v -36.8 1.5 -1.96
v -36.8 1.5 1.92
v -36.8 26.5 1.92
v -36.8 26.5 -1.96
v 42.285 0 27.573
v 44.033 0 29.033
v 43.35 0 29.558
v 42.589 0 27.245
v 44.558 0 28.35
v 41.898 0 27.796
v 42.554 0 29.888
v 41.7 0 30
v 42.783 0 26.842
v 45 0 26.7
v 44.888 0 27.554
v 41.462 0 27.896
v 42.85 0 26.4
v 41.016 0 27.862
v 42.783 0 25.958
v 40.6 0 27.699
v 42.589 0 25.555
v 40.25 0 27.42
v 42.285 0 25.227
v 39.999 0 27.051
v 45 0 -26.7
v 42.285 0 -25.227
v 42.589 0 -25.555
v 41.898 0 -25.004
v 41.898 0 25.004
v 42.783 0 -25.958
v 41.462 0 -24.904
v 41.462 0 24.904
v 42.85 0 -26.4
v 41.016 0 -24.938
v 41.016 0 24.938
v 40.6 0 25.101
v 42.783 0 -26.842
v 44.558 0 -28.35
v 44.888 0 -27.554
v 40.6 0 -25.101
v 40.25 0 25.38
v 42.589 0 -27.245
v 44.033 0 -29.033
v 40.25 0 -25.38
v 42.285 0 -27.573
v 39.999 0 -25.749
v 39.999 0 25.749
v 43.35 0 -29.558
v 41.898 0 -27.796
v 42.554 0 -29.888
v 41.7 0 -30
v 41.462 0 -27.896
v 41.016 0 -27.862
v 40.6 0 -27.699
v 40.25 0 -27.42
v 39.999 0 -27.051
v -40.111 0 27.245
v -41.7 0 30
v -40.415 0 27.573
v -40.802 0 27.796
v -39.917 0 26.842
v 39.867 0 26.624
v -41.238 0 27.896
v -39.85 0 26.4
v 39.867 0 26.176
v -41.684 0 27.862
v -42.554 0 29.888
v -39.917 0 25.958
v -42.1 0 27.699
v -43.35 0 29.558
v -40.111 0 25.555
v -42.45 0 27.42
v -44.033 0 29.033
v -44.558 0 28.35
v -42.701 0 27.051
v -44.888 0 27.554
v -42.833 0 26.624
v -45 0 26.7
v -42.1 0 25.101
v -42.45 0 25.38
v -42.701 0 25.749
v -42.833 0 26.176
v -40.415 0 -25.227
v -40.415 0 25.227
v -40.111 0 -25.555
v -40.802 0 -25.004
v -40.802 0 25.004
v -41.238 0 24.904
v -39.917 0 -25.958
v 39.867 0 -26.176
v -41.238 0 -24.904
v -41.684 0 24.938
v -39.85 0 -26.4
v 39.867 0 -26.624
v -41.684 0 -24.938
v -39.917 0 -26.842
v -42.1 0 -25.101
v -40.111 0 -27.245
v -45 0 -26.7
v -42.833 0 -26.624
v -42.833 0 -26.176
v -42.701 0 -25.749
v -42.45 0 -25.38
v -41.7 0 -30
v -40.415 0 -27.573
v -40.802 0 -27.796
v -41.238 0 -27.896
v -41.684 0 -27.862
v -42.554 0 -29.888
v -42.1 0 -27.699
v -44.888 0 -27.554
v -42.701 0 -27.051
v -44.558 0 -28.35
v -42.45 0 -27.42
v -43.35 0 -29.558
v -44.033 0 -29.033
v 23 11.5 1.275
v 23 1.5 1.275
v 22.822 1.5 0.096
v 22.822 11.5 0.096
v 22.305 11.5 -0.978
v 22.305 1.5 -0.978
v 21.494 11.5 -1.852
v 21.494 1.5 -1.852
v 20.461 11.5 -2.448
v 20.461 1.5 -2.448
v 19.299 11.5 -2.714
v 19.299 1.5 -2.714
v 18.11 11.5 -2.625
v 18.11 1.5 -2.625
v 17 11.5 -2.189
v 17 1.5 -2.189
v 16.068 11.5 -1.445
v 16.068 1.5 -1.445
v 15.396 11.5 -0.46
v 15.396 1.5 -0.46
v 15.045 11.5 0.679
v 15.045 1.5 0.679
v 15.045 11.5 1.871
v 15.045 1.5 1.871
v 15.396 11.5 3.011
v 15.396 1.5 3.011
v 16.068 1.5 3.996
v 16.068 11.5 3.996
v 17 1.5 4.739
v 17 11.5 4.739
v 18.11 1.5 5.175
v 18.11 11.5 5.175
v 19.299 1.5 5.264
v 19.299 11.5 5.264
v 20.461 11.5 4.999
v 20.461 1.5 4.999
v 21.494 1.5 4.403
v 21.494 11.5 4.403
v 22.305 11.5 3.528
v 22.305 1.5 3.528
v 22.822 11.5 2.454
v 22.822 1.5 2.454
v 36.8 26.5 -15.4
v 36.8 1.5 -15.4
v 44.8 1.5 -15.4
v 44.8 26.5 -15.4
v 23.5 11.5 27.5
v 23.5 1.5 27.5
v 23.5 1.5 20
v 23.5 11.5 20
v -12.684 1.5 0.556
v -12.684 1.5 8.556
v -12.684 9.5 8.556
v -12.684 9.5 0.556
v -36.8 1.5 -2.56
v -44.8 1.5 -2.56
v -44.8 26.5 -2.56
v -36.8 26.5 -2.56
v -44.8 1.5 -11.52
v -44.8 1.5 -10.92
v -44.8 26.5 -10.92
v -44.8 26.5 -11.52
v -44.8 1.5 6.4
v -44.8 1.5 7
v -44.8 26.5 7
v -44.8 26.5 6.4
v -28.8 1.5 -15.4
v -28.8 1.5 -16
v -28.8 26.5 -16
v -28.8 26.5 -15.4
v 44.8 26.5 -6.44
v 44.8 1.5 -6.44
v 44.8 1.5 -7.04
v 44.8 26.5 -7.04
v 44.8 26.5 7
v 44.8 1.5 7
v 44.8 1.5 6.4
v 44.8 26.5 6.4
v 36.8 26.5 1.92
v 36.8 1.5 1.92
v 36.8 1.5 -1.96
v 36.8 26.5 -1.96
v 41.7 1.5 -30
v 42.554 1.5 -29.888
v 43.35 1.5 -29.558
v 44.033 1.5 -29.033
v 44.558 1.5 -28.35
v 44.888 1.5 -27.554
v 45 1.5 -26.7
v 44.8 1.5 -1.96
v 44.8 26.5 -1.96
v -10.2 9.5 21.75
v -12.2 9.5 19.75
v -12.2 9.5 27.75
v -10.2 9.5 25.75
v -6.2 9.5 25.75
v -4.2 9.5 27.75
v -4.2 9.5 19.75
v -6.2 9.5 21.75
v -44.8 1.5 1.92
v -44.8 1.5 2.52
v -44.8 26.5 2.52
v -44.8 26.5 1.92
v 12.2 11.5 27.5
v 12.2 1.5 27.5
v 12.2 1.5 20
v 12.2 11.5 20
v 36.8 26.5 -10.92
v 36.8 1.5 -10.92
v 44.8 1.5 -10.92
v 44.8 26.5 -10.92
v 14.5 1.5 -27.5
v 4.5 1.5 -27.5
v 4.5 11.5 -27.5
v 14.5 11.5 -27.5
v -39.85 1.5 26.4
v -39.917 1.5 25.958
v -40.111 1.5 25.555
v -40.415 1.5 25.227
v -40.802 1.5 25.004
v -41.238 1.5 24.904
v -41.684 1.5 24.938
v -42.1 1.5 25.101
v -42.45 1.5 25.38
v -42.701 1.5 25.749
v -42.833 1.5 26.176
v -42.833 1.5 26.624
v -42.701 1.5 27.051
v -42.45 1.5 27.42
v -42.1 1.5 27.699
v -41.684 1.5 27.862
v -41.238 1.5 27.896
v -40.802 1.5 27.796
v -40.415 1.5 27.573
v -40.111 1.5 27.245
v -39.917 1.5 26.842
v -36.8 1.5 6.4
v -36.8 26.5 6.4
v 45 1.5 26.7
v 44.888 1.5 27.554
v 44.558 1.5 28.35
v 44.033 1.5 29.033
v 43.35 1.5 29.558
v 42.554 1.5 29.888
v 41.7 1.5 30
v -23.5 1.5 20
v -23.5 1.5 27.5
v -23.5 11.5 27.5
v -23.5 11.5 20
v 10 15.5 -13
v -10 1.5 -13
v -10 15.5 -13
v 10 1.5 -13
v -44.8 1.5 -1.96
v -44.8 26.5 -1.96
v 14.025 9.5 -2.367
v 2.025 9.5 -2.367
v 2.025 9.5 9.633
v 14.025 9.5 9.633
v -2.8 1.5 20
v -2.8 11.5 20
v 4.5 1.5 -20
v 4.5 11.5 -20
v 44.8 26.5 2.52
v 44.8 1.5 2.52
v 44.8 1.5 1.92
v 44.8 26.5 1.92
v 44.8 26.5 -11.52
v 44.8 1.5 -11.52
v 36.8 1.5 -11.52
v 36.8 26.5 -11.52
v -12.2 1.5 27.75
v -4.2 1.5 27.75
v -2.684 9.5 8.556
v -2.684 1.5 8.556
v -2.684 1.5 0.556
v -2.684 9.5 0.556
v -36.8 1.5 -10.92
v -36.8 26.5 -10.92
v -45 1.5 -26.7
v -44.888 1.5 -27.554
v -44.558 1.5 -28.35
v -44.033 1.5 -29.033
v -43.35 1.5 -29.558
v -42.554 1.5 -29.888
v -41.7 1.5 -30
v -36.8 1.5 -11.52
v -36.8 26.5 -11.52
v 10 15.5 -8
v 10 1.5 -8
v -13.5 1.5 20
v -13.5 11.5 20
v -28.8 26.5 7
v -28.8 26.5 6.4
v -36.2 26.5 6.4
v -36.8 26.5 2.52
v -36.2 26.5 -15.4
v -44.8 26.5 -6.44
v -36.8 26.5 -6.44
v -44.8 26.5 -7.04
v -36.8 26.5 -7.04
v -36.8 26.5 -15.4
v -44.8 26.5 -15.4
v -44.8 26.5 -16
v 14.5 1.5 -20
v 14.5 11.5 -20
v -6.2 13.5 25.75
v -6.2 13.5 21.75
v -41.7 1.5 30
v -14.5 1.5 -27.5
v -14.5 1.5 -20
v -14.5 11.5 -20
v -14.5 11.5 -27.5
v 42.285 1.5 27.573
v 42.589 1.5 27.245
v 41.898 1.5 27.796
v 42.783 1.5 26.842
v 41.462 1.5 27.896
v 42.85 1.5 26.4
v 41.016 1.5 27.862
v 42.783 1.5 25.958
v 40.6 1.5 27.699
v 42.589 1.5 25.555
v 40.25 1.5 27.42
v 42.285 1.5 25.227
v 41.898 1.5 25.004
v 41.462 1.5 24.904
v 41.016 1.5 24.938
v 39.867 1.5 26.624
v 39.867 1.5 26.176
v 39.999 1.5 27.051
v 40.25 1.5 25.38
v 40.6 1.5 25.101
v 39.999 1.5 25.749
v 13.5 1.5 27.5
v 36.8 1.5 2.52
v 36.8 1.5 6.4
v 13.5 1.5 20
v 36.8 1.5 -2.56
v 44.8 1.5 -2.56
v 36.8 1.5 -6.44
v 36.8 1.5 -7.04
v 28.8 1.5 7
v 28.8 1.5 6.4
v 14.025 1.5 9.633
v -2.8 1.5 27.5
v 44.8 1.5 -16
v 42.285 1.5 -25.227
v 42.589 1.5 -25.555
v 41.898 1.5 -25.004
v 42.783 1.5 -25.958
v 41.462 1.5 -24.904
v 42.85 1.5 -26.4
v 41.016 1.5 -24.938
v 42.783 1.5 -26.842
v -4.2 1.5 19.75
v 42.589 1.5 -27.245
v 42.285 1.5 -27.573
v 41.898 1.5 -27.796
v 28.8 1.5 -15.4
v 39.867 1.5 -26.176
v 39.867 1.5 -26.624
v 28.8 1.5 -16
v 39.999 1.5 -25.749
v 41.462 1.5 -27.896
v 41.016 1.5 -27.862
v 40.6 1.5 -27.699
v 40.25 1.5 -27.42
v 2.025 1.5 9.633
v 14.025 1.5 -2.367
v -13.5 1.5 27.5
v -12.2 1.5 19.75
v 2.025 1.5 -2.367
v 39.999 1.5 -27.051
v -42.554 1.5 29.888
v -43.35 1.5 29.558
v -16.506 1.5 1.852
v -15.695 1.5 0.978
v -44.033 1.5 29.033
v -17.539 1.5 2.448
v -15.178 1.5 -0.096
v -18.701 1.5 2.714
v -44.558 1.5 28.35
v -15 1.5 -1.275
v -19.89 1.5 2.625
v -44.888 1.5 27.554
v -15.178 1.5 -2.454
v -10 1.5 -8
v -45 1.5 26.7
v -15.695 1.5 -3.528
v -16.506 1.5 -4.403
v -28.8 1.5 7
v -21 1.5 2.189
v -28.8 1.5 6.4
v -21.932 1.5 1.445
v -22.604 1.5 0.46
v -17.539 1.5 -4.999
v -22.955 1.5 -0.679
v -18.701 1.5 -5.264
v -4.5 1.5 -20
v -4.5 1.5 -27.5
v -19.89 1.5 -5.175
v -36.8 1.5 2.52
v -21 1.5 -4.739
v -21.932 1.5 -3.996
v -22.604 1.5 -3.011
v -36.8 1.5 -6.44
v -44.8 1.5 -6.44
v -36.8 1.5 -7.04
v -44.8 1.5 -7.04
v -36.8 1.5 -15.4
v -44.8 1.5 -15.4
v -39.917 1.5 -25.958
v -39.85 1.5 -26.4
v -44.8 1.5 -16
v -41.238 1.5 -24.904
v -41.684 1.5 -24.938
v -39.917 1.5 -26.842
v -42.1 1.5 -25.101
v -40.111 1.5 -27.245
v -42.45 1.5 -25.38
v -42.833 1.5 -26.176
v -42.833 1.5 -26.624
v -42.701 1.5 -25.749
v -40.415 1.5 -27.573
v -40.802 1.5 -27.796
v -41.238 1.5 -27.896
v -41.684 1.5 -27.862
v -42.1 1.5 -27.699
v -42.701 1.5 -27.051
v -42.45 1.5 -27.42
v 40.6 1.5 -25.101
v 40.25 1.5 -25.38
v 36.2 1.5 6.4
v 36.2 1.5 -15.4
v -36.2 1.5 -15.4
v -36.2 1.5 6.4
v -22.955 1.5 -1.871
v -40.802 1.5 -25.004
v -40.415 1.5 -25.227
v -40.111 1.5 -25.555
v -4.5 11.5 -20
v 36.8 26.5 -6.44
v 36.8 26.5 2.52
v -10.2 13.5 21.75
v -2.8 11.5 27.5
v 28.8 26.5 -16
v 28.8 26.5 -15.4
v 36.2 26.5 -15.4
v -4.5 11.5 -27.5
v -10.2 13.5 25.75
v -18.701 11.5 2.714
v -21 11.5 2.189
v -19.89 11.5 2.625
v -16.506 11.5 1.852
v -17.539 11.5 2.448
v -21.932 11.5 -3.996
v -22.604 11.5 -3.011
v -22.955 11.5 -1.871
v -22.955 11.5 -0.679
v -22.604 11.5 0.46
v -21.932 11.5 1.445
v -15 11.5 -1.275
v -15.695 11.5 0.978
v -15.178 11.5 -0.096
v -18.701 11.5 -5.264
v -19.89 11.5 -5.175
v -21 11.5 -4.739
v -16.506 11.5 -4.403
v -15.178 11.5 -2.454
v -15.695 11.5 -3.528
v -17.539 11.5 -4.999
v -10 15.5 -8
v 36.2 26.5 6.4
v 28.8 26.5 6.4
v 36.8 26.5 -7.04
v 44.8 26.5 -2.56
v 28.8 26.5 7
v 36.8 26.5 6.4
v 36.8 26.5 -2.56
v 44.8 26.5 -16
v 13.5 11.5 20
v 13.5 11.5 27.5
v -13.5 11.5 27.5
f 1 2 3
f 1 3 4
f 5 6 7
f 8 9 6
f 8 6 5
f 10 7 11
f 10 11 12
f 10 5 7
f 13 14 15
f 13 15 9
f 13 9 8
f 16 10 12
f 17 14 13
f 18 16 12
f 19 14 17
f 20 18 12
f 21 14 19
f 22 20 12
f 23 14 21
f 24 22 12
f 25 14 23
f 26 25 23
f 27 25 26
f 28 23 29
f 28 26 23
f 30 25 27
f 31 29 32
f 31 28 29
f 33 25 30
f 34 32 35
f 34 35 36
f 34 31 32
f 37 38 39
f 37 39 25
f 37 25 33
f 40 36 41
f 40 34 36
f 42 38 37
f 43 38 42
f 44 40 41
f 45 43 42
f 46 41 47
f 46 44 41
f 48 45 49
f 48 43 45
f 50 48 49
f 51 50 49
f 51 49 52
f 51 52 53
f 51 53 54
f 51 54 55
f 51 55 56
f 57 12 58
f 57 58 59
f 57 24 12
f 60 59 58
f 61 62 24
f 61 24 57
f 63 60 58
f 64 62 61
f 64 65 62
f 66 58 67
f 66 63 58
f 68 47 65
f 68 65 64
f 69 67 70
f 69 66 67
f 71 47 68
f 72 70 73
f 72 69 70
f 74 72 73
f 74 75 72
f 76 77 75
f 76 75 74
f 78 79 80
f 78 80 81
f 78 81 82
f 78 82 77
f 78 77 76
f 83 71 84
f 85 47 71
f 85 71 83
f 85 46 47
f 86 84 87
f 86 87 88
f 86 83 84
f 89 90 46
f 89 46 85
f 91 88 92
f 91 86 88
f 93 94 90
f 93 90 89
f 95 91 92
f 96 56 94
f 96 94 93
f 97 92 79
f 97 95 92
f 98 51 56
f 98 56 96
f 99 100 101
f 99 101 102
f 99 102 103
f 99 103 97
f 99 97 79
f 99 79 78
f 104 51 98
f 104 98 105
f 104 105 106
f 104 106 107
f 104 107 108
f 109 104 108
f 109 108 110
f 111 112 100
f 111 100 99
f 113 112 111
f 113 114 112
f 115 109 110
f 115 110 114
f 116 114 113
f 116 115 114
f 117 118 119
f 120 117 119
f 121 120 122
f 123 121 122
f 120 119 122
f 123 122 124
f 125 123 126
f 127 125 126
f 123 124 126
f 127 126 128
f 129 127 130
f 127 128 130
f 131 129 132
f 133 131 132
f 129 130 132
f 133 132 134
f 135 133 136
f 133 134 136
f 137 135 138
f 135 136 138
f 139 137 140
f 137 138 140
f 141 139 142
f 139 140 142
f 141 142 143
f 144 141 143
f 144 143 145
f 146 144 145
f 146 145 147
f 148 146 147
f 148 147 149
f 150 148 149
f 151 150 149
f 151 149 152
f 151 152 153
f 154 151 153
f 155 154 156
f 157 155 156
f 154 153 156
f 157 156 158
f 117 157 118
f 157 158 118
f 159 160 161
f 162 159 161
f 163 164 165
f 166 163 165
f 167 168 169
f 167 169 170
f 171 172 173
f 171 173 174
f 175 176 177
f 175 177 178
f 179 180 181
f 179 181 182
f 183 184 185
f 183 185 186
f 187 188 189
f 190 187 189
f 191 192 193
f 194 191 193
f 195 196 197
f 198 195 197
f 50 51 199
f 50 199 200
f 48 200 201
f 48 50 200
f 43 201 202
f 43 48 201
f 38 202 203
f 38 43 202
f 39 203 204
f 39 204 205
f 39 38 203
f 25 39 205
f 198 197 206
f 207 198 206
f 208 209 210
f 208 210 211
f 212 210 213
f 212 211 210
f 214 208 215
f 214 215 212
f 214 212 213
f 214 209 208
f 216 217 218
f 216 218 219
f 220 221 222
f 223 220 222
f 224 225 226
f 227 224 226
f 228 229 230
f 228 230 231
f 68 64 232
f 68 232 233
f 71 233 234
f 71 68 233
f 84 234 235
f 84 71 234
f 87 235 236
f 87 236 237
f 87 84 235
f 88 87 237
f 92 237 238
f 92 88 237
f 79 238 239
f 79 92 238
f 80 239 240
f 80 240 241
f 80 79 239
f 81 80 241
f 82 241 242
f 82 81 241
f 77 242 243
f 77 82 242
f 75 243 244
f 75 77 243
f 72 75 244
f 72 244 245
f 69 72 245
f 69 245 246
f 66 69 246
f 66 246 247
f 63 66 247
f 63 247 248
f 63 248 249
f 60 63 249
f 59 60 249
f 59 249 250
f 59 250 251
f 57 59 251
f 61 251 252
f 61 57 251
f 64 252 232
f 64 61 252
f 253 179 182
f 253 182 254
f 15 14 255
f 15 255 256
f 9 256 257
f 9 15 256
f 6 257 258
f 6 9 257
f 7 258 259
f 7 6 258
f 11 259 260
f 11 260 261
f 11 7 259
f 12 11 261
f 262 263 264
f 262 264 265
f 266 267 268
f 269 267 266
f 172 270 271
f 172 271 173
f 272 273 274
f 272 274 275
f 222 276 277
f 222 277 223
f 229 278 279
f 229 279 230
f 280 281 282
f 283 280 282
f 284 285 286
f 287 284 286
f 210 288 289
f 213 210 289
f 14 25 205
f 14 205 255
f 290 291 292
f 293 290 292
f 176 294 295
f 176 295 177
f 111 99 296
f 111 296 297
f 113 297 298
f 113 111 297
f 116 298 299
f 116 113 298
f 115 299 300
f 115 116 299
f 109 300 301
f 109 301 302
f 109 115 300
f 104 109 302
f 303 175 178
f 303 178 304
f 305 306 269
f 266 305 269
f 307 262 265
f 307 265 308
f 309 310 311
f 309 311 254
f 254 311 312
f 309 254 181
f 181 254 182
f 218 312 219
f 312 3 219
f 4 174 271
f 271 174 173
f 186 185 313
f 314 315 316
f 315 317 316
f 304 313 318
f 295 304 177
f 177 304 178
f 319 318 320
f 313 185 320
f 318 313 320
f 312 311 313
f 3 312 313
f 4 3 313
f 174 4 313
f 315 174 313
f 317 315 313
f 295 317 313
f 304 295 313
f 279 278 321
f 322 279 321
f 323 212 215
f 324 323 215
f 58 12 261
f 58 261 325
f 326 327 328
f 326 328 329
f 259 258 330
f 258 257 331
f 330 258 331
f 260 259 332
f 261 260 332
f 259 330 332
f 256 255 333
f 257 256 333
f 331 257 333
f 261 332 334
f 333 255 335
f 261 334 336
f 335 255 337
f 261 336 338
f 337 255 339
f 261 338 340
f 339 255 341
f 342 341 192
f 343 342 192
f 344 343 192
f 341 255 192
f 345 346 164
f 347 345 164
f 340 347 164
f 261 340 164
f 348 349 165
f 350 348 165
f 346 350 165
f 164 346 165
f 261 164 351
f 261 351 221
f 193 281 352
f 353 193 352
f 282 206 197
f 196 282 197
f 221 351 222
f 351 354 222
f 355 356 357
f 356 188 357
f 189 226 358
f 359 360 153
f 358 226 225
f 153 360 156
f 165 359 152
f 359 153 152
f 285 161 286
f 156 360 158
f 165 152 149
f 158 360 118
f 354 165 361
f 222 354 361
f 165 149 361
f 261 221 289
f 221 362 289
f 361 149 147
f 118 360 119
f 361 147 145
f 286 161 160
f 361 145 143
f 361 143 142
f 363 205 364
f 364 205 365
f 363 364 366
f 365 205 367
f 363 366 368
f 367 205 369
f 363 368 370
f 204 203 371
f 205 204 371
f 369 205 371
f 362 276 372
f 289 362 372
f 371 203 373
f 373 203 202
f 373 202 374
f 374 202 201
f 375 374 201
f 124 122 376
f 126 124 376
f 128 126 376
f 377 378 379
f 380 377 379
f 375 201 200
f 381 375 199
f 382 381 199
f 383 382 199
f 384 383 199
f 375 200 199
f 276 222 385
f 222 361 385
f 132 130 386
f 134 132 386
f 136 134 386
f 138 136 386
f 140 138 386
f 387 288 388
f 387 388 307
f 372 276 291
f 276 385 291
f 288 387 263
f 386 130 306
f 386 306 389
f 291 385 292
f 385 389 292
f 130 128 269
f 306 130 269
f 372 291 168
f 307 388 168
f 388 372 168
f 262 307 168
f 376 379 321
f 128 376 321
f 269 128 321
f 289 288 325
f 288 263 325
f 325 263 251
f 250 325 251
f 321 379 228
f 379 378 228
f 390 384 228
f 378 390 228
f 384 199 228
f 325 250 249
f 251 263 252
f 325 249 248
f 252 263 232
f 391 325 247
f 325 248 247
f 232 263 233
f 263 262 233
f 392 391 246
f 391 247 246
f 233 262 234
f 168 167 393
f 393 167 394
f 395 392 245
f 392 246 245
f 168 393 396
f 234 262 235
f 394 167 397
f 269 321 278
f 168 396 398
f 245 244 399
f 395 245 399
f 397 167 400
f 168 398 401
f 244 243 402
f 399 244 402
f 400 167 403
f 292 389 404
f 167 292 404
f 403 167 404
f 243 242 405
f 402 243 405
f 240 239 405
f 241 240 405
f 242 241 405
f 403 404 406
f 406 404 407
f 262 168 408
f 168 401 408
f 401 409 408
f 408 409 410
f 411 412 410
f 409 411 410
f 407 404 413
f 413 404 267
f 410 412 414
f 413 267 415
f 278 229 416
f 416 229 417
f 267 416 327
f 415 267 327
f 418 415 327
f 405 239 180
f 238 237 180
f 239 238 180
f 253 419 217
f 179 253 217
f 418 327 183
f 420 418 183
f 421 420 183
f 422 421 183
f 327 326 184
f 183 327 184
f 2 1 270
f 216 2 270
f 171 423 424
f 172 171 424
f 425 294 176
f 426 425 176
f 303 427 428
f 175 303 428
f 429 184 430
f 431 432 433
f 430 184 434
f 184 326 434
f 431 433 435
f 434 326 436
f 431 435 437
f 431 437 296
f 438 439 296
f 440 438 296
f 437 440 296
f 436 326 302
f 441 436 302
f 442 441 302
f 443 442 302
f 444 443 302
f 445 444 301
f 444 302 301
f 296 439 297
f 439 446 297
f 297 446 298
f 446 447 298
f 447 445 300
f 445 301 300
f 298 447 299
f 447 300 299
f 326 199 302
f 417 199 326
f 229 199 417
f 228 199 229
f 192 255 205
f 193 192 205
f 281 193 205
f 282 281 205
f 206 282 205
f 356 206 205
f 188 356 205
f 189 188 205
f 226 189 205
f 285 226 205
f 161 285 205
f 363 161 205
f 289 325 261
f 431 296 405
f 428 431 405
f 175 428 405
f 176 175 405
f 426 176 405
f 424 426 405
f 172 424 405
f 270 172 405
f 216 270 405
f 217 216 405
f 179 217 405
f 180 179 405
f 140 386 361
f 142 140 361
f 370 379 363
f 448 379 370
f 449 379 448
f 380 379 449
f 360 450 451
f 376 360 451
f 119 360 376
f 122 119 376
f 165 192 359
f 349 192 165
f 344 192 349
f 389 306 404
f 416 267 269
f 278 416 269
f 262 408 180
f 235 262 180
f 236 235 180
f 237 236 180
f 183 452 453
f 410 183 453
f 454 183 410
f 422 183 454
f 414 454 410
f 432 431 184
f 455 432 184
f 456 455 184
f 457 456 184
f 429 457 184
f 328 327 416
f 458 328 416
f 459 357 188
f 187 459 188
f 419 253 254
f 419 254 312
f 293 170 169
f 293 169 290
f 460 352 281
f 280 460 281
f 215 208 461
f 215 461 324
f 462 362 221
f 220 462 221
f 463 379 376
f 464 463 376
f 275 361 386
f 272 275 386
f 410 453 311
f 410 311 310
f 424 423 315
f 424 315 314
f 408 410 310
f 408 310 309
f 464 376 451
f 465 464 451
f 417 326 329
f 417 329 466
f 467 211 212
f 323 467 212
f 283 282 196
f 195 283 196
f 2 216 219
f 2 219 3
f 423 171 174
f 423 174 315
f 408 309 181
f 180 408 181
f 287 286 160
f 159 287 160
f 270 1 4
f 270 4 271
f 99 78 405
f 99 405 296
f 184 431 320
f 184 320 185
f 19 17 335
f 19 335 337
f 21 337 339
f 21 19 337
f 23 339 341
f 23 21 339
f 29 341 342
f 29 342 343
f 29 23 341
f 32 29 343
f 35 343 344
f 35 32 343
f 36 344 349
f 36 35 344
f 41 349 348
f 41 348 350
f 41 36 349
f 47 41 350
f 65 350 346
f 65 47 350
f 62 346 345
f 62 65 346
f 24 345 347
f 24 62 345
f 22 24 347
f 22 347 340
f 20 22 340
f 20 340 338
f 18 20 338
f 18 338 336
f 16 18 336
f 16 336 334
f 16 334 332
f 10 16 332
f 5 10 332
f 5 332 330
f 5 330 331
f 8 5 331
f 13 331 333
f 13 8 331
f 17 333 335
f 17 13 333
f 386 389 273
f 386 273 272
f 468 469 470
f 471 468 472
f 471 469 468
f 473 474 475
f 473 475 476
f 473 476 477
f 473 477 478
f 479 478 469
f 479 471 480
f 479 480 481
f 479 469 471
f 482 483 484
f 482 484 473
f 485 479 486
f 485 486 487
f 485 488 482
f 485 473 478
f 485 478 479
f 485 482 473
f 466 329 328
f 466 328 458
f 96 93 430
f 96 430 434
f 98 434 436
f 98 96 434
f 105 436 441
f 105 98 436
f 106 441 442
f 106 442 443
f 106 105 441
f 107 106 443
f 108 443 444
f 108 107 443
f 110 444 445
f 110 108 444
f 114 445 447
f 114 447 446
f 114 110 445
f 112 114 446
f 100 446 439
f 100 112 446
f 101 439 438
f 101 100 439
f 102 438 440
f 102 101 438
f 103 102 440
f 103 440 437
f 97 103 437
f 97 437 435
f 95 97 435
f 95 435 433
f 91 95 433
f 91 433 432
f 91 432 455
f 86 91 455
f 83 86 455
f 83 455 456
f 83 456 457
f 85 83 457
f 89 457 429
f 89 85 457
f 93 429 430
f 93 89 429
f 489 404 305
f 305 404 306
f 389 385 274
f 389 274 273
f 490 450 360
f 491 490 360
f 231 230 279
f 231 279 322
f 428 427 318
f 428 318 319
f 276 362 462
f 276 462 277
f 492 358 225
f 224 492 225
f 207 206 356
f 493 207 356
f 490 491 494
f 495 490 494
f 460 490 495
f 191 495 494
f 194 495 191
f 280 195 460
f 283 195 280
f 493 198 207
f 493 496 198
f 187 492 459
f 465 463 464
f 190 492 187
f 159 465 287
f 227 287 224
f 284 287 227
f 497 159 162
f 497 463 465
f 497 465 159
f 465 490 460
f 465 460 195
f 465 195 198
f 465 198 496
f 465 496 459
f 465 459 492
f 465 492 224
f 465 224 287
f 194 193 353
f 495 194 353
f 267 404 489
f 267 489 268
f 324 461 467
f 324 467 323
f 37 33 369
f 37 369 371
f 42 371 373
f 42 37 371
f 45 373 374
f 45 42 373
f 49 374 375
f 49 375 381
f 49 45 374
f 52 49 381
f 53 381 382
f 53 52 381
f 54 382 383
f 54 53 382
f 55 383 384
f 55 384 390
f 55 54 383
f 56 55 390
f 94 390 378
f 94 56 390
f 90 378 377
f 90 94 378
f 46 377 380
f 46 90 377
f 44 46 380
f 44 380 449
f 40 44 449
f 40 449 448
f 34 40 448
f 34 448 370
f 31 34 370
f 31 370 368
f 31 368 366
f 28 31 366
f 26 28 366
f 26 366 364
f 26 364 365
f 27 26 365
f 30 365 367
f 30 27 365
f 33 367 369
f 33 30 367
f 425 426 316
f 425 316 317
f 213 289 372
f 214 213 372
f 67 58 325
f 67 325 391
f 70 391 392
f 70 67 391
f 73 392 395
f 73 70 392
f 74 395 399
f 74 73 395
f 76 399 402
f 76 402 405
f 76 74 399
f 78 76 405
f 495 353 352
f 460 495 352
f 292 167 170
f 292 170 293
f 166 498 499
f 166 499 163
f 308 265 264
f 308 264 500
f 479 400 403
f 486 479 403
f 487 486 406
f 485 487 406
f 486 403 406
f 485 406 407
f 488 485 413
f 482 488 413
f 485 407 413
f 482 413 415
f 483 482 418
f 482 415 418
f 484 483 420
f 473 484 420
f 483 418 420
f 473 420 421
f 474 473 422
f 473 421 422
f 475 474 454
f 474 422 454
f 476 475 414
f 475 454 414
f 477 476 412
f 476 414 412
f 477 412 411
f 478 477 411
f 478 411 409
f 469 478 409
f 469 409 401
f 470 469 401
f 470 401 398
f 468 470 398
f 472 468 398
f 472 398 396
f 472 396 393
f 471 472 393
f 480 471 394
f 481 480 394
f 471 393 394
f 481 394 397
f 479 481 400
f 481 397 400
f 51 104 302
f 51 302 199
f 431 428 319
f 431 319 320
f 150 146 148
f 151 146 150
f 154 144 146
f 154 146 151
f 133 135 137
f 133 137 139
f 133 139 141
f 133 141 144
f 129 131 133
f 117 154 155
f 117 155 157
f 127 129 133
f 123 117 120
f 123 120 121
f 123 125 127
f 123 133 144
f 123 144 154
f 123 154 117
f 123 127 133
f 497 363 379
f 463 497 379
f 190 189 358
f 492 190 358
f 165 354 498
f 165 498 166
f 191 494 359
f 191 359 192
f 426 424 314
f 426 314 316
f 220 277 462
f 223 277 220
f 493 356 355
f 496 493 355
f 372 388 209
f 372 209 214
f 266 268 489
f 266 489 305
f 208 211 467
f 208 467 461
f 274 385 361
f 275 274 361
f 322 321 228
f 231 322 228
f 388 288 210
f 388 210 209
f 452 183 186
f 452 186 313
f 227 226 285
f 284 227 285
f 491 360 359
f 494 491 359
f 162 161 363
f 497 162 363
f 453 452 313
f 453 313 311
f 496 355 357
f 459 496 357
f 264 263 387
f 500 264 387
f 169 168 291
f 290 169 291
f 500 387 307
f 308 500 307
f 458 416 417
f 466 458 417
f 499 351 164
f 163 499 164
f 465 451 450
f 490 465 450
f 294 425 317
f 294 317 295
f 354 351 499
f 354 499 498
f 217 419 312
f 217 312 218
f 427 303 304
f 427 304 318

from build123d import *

# Parameters (mm, degrees)
SKETCH_1_R      = 1.5
EXTRUDE_1_DEPTH = 1.5
SKETCH_2_W      = 10
SKETCH_2_H      = 7.5
EXTRUDE_2_DEPTH = 10
SKETCH_3_W      = 8
SKETCH_3_H      = 8
EXTRUDE_3_DEPTH = 8
SKETCH_4_W      = 15
SKETCH_4_H      = 7.5
EXTRUDE_4_DEPTH = 10
EXTRUDE_5_DEPTH = 25
SKETCH_6_W      = 4
SKETCH_6_H      = 4
EXTRUDE_6_DEPTH = 4
SKETCH_7_W      = 20
SKETCH_7_H      = 5
EXTRUDE_7_DEPTH = 14
SKETCH_8_W      = 12
SKETCH_8_H      = 12
SKETCH_8_W_2    = 10
SKETCH_8_H_2    = 8
EXTRUDE_8_DEPTH = 8
SKETCH_9_R      = 4
EXTRUDE_9_DEPTH = 10


with BuildPart() as part:
    # 草图1 → 凸台-拉伸1 (new body)
    with BuildSketch(Plane(origin=(0, 0, 0), x_dir=(1, 0, 0), z_dir=(0, 1, 0))):
        with BuildLine():
            Line((-41.7, 30), (41.7, 30))
            ThreePointArc((41.7, 30), (44.033452378, 29.033452378), (45, 26.7))
            Line((45, 26.7), (45, -26.7))
            ThreePointArc((45, -26.7), (44.033452378, -29.033452378), (41.7, -30))
            Line((41.7, -30), (-41.7, -30))
            ThreePointArc((-41.7, -30), (-44.033452378, -29.033452378), (-45, -26.7))
            Line((-45, -26.7), (-45, 26.7))
            ThreePointArc((-45, 26.7), (-44.033452378, 29.033452378), (-41.7, 30))
        make_face()
        with Locations((-41.35, 26.4)):
            Circle(SKETCH_1_R, mode=Mode.SUBTRACT)
        with Locations((41.35, 26.4)):
            Circle(SKETCH_1_R, mode=Mode.SUBTRACT)
        with Locations((41.35, -26.4)):
            Circle(SKETCH_1_R, mode=Mode.SUBTRACT)
        with Locations((-41.35, -26.4)):
            Circle(SKETCH_1_R, mode=Mode.SUBTRACT)
    extrude(amount=EXTRUDE_1_DEPTH)

    # 草图2 → 凸台-拉伸2 (add)
    with BuildSketch(Plane(origin=(0, 1.5, 0), x_dir=(1, 0, 0), z_dir=(0, 1, 0))):
        with Locations((18.5, -23.75)):
            Rectangle(SKETCH_2_W, SKETCH_2_H)
        with Locations((-9.5, 23.75)):
            Rectangle(SKETCH_2_W, SKETCH_2_H)
        with Locations((9.5, 23.75)):
            Rectangle(SKETCH_2_W, SKETCH_2_H)
        with Locations((-18.5, -23.75)):
            Rectangle(SKETCH_2_W, SKETCH_2_H)
    extrude(amount=EXTRUDE_2_DEPTH)

    # 草图3 → 凸台-拉伸3 (add)
    with BuildSketch(Plane(origin=(0, 1.5, 0), x_dir=(1, 0, 0), z_dir=(0, 1, 0))):
        with Locations((-8.2, -23.75)):
            Rectangle(SKETCH_3_W, SKETCH_3_H)
    extrude(amount=EXTRUDE_3_DEPTH)

    # 草图4 → 凸台-拉伸4 (add)
    with BuildSketch(Plane(origin=(0, 1.5, 0), x_dir=(1, 0, 0), z_dir=(0, 1, 0))):
        with Locations((4.7, -23.75)):
            Rectangle(SKETCH_4_W, SKETCH_4_H)
    extrude(amount=EXTRUDE_4_DEPTH)

    # 草图5 → 凸台-拉伸5 (add)
    with BuildSketch(Plane(origin=(0, 1.5, 0), x_dir=(1, 0, 0), z_dir=(0, 1, 0))):
        Polygon((44.8, 16), (28.8, 16), (28.8, 15.4), (36.2, 15.4), (36.2, -6.4), (28.8, -6.4), (28.8, -7), (44.8, -7), (44.8, -6.4), (36.8, -6.4), (36.8, -2.52), (44.8, -2.52), (44.8, -1.92), (36.8, -1.92), (36.8, 1.96), (44.8, 1.96), (44.8, 2.56), (36.8, 2.56), (36.8, 6.44), (44.8, 6.44), (44.8, 7.04), (36.8, 7.04), (36.8, 10.92), (44.8, 10.92), (44.8, 11.52), (36.8, 11.52), (36.8, 15.4), (44.8, 15.4), align=None)
        Polygon((-44.8, 15.4), (-44.8, 16), (-28.8, 16), (-28.8, 15.4), (-36.2, 15.4), (-36.2, -6.4), (-28.8, -6.4), (-28.8, -7), (-44.8, -7), (-44.8, -6.4), (-36.8, -6.4), (-36.8, -2.52), (-44.8, -2.52), (-44.8, -1.92), (-36.8, -1.92), (-36.8, 1.96), (-44.8, 1.96), (-44.8, 2.56), (-36.8, 2.56), (-36.8, 6.44), (-44.8, 6.44), (-44.8, 7.04), (-36.8, 7.04), (-36.8, 10.92), (-44.8, 10.92), (-44.8, 11.52), (-36.8, 11.52), (-36.8, 15.4), align=None)
    extrude(amount=EXTRUDE_5_DEPTH)

    # 草图6 → 凸台-拉伸6 (add)
    with BuildSketch(Plane(origin=(0, 9.5, 0), x_dir=(1, 0, 0), z_dir=(0, 1, 0))):
        with Locations((-8.2, -23.75)):
            Rectangle(SKETCH_6_W, SKETCH_6_H)
    extrude(amount=EXTRUDE_6_DEPTH)

    # 草图7 → 凸台-拉伸7 (add)
    with BuildSketch(Plane(origin=(0, 1.5, 0), x_dir=(1, 0, 0), z_dir=(0, 1, 0))):
        with Locations((0, 10.5)):
            Rectangle(SKETCH_7_W, SKETCH_7_H)
    extrude(amount=EXTRUDE_7_DEPTH)

    # 草图8 → 凸台-拉伸8 (add)
    with BuildSketch(Plane(origin=(0, 1.5, 0), x_dir=(1, 0, 0), z_dir=(0, 1, 0))):
        with Locations((8.02497304, -3.633209752)):
            Rectangle(SKETCH_8_W, SKETCH_8_H)
        with Locations((-7.684380811, -4.555618829)):
            Rectangle(SKETCH_8_W_2, SKETCH_8_H_2)
    extrude(amount=EXTRUDE_8_DEPTH)

    # 草图9 → 凸台-拉伸9 (add)
    with BuildSketch(Plane(origin=(0, 1.5, 0), x_dir=(1, 0, 0), z_dir=(0, 1, 0))):
        with Locations((-19, 1.275195949)):
            Circle(SKETCH_9_R)
        with Locations((19, -1.275195949)):
            Circle(SKETCH_9_R)
    extrude(amount=EXTRUDE_9_DEPTH)


solid = part.part
